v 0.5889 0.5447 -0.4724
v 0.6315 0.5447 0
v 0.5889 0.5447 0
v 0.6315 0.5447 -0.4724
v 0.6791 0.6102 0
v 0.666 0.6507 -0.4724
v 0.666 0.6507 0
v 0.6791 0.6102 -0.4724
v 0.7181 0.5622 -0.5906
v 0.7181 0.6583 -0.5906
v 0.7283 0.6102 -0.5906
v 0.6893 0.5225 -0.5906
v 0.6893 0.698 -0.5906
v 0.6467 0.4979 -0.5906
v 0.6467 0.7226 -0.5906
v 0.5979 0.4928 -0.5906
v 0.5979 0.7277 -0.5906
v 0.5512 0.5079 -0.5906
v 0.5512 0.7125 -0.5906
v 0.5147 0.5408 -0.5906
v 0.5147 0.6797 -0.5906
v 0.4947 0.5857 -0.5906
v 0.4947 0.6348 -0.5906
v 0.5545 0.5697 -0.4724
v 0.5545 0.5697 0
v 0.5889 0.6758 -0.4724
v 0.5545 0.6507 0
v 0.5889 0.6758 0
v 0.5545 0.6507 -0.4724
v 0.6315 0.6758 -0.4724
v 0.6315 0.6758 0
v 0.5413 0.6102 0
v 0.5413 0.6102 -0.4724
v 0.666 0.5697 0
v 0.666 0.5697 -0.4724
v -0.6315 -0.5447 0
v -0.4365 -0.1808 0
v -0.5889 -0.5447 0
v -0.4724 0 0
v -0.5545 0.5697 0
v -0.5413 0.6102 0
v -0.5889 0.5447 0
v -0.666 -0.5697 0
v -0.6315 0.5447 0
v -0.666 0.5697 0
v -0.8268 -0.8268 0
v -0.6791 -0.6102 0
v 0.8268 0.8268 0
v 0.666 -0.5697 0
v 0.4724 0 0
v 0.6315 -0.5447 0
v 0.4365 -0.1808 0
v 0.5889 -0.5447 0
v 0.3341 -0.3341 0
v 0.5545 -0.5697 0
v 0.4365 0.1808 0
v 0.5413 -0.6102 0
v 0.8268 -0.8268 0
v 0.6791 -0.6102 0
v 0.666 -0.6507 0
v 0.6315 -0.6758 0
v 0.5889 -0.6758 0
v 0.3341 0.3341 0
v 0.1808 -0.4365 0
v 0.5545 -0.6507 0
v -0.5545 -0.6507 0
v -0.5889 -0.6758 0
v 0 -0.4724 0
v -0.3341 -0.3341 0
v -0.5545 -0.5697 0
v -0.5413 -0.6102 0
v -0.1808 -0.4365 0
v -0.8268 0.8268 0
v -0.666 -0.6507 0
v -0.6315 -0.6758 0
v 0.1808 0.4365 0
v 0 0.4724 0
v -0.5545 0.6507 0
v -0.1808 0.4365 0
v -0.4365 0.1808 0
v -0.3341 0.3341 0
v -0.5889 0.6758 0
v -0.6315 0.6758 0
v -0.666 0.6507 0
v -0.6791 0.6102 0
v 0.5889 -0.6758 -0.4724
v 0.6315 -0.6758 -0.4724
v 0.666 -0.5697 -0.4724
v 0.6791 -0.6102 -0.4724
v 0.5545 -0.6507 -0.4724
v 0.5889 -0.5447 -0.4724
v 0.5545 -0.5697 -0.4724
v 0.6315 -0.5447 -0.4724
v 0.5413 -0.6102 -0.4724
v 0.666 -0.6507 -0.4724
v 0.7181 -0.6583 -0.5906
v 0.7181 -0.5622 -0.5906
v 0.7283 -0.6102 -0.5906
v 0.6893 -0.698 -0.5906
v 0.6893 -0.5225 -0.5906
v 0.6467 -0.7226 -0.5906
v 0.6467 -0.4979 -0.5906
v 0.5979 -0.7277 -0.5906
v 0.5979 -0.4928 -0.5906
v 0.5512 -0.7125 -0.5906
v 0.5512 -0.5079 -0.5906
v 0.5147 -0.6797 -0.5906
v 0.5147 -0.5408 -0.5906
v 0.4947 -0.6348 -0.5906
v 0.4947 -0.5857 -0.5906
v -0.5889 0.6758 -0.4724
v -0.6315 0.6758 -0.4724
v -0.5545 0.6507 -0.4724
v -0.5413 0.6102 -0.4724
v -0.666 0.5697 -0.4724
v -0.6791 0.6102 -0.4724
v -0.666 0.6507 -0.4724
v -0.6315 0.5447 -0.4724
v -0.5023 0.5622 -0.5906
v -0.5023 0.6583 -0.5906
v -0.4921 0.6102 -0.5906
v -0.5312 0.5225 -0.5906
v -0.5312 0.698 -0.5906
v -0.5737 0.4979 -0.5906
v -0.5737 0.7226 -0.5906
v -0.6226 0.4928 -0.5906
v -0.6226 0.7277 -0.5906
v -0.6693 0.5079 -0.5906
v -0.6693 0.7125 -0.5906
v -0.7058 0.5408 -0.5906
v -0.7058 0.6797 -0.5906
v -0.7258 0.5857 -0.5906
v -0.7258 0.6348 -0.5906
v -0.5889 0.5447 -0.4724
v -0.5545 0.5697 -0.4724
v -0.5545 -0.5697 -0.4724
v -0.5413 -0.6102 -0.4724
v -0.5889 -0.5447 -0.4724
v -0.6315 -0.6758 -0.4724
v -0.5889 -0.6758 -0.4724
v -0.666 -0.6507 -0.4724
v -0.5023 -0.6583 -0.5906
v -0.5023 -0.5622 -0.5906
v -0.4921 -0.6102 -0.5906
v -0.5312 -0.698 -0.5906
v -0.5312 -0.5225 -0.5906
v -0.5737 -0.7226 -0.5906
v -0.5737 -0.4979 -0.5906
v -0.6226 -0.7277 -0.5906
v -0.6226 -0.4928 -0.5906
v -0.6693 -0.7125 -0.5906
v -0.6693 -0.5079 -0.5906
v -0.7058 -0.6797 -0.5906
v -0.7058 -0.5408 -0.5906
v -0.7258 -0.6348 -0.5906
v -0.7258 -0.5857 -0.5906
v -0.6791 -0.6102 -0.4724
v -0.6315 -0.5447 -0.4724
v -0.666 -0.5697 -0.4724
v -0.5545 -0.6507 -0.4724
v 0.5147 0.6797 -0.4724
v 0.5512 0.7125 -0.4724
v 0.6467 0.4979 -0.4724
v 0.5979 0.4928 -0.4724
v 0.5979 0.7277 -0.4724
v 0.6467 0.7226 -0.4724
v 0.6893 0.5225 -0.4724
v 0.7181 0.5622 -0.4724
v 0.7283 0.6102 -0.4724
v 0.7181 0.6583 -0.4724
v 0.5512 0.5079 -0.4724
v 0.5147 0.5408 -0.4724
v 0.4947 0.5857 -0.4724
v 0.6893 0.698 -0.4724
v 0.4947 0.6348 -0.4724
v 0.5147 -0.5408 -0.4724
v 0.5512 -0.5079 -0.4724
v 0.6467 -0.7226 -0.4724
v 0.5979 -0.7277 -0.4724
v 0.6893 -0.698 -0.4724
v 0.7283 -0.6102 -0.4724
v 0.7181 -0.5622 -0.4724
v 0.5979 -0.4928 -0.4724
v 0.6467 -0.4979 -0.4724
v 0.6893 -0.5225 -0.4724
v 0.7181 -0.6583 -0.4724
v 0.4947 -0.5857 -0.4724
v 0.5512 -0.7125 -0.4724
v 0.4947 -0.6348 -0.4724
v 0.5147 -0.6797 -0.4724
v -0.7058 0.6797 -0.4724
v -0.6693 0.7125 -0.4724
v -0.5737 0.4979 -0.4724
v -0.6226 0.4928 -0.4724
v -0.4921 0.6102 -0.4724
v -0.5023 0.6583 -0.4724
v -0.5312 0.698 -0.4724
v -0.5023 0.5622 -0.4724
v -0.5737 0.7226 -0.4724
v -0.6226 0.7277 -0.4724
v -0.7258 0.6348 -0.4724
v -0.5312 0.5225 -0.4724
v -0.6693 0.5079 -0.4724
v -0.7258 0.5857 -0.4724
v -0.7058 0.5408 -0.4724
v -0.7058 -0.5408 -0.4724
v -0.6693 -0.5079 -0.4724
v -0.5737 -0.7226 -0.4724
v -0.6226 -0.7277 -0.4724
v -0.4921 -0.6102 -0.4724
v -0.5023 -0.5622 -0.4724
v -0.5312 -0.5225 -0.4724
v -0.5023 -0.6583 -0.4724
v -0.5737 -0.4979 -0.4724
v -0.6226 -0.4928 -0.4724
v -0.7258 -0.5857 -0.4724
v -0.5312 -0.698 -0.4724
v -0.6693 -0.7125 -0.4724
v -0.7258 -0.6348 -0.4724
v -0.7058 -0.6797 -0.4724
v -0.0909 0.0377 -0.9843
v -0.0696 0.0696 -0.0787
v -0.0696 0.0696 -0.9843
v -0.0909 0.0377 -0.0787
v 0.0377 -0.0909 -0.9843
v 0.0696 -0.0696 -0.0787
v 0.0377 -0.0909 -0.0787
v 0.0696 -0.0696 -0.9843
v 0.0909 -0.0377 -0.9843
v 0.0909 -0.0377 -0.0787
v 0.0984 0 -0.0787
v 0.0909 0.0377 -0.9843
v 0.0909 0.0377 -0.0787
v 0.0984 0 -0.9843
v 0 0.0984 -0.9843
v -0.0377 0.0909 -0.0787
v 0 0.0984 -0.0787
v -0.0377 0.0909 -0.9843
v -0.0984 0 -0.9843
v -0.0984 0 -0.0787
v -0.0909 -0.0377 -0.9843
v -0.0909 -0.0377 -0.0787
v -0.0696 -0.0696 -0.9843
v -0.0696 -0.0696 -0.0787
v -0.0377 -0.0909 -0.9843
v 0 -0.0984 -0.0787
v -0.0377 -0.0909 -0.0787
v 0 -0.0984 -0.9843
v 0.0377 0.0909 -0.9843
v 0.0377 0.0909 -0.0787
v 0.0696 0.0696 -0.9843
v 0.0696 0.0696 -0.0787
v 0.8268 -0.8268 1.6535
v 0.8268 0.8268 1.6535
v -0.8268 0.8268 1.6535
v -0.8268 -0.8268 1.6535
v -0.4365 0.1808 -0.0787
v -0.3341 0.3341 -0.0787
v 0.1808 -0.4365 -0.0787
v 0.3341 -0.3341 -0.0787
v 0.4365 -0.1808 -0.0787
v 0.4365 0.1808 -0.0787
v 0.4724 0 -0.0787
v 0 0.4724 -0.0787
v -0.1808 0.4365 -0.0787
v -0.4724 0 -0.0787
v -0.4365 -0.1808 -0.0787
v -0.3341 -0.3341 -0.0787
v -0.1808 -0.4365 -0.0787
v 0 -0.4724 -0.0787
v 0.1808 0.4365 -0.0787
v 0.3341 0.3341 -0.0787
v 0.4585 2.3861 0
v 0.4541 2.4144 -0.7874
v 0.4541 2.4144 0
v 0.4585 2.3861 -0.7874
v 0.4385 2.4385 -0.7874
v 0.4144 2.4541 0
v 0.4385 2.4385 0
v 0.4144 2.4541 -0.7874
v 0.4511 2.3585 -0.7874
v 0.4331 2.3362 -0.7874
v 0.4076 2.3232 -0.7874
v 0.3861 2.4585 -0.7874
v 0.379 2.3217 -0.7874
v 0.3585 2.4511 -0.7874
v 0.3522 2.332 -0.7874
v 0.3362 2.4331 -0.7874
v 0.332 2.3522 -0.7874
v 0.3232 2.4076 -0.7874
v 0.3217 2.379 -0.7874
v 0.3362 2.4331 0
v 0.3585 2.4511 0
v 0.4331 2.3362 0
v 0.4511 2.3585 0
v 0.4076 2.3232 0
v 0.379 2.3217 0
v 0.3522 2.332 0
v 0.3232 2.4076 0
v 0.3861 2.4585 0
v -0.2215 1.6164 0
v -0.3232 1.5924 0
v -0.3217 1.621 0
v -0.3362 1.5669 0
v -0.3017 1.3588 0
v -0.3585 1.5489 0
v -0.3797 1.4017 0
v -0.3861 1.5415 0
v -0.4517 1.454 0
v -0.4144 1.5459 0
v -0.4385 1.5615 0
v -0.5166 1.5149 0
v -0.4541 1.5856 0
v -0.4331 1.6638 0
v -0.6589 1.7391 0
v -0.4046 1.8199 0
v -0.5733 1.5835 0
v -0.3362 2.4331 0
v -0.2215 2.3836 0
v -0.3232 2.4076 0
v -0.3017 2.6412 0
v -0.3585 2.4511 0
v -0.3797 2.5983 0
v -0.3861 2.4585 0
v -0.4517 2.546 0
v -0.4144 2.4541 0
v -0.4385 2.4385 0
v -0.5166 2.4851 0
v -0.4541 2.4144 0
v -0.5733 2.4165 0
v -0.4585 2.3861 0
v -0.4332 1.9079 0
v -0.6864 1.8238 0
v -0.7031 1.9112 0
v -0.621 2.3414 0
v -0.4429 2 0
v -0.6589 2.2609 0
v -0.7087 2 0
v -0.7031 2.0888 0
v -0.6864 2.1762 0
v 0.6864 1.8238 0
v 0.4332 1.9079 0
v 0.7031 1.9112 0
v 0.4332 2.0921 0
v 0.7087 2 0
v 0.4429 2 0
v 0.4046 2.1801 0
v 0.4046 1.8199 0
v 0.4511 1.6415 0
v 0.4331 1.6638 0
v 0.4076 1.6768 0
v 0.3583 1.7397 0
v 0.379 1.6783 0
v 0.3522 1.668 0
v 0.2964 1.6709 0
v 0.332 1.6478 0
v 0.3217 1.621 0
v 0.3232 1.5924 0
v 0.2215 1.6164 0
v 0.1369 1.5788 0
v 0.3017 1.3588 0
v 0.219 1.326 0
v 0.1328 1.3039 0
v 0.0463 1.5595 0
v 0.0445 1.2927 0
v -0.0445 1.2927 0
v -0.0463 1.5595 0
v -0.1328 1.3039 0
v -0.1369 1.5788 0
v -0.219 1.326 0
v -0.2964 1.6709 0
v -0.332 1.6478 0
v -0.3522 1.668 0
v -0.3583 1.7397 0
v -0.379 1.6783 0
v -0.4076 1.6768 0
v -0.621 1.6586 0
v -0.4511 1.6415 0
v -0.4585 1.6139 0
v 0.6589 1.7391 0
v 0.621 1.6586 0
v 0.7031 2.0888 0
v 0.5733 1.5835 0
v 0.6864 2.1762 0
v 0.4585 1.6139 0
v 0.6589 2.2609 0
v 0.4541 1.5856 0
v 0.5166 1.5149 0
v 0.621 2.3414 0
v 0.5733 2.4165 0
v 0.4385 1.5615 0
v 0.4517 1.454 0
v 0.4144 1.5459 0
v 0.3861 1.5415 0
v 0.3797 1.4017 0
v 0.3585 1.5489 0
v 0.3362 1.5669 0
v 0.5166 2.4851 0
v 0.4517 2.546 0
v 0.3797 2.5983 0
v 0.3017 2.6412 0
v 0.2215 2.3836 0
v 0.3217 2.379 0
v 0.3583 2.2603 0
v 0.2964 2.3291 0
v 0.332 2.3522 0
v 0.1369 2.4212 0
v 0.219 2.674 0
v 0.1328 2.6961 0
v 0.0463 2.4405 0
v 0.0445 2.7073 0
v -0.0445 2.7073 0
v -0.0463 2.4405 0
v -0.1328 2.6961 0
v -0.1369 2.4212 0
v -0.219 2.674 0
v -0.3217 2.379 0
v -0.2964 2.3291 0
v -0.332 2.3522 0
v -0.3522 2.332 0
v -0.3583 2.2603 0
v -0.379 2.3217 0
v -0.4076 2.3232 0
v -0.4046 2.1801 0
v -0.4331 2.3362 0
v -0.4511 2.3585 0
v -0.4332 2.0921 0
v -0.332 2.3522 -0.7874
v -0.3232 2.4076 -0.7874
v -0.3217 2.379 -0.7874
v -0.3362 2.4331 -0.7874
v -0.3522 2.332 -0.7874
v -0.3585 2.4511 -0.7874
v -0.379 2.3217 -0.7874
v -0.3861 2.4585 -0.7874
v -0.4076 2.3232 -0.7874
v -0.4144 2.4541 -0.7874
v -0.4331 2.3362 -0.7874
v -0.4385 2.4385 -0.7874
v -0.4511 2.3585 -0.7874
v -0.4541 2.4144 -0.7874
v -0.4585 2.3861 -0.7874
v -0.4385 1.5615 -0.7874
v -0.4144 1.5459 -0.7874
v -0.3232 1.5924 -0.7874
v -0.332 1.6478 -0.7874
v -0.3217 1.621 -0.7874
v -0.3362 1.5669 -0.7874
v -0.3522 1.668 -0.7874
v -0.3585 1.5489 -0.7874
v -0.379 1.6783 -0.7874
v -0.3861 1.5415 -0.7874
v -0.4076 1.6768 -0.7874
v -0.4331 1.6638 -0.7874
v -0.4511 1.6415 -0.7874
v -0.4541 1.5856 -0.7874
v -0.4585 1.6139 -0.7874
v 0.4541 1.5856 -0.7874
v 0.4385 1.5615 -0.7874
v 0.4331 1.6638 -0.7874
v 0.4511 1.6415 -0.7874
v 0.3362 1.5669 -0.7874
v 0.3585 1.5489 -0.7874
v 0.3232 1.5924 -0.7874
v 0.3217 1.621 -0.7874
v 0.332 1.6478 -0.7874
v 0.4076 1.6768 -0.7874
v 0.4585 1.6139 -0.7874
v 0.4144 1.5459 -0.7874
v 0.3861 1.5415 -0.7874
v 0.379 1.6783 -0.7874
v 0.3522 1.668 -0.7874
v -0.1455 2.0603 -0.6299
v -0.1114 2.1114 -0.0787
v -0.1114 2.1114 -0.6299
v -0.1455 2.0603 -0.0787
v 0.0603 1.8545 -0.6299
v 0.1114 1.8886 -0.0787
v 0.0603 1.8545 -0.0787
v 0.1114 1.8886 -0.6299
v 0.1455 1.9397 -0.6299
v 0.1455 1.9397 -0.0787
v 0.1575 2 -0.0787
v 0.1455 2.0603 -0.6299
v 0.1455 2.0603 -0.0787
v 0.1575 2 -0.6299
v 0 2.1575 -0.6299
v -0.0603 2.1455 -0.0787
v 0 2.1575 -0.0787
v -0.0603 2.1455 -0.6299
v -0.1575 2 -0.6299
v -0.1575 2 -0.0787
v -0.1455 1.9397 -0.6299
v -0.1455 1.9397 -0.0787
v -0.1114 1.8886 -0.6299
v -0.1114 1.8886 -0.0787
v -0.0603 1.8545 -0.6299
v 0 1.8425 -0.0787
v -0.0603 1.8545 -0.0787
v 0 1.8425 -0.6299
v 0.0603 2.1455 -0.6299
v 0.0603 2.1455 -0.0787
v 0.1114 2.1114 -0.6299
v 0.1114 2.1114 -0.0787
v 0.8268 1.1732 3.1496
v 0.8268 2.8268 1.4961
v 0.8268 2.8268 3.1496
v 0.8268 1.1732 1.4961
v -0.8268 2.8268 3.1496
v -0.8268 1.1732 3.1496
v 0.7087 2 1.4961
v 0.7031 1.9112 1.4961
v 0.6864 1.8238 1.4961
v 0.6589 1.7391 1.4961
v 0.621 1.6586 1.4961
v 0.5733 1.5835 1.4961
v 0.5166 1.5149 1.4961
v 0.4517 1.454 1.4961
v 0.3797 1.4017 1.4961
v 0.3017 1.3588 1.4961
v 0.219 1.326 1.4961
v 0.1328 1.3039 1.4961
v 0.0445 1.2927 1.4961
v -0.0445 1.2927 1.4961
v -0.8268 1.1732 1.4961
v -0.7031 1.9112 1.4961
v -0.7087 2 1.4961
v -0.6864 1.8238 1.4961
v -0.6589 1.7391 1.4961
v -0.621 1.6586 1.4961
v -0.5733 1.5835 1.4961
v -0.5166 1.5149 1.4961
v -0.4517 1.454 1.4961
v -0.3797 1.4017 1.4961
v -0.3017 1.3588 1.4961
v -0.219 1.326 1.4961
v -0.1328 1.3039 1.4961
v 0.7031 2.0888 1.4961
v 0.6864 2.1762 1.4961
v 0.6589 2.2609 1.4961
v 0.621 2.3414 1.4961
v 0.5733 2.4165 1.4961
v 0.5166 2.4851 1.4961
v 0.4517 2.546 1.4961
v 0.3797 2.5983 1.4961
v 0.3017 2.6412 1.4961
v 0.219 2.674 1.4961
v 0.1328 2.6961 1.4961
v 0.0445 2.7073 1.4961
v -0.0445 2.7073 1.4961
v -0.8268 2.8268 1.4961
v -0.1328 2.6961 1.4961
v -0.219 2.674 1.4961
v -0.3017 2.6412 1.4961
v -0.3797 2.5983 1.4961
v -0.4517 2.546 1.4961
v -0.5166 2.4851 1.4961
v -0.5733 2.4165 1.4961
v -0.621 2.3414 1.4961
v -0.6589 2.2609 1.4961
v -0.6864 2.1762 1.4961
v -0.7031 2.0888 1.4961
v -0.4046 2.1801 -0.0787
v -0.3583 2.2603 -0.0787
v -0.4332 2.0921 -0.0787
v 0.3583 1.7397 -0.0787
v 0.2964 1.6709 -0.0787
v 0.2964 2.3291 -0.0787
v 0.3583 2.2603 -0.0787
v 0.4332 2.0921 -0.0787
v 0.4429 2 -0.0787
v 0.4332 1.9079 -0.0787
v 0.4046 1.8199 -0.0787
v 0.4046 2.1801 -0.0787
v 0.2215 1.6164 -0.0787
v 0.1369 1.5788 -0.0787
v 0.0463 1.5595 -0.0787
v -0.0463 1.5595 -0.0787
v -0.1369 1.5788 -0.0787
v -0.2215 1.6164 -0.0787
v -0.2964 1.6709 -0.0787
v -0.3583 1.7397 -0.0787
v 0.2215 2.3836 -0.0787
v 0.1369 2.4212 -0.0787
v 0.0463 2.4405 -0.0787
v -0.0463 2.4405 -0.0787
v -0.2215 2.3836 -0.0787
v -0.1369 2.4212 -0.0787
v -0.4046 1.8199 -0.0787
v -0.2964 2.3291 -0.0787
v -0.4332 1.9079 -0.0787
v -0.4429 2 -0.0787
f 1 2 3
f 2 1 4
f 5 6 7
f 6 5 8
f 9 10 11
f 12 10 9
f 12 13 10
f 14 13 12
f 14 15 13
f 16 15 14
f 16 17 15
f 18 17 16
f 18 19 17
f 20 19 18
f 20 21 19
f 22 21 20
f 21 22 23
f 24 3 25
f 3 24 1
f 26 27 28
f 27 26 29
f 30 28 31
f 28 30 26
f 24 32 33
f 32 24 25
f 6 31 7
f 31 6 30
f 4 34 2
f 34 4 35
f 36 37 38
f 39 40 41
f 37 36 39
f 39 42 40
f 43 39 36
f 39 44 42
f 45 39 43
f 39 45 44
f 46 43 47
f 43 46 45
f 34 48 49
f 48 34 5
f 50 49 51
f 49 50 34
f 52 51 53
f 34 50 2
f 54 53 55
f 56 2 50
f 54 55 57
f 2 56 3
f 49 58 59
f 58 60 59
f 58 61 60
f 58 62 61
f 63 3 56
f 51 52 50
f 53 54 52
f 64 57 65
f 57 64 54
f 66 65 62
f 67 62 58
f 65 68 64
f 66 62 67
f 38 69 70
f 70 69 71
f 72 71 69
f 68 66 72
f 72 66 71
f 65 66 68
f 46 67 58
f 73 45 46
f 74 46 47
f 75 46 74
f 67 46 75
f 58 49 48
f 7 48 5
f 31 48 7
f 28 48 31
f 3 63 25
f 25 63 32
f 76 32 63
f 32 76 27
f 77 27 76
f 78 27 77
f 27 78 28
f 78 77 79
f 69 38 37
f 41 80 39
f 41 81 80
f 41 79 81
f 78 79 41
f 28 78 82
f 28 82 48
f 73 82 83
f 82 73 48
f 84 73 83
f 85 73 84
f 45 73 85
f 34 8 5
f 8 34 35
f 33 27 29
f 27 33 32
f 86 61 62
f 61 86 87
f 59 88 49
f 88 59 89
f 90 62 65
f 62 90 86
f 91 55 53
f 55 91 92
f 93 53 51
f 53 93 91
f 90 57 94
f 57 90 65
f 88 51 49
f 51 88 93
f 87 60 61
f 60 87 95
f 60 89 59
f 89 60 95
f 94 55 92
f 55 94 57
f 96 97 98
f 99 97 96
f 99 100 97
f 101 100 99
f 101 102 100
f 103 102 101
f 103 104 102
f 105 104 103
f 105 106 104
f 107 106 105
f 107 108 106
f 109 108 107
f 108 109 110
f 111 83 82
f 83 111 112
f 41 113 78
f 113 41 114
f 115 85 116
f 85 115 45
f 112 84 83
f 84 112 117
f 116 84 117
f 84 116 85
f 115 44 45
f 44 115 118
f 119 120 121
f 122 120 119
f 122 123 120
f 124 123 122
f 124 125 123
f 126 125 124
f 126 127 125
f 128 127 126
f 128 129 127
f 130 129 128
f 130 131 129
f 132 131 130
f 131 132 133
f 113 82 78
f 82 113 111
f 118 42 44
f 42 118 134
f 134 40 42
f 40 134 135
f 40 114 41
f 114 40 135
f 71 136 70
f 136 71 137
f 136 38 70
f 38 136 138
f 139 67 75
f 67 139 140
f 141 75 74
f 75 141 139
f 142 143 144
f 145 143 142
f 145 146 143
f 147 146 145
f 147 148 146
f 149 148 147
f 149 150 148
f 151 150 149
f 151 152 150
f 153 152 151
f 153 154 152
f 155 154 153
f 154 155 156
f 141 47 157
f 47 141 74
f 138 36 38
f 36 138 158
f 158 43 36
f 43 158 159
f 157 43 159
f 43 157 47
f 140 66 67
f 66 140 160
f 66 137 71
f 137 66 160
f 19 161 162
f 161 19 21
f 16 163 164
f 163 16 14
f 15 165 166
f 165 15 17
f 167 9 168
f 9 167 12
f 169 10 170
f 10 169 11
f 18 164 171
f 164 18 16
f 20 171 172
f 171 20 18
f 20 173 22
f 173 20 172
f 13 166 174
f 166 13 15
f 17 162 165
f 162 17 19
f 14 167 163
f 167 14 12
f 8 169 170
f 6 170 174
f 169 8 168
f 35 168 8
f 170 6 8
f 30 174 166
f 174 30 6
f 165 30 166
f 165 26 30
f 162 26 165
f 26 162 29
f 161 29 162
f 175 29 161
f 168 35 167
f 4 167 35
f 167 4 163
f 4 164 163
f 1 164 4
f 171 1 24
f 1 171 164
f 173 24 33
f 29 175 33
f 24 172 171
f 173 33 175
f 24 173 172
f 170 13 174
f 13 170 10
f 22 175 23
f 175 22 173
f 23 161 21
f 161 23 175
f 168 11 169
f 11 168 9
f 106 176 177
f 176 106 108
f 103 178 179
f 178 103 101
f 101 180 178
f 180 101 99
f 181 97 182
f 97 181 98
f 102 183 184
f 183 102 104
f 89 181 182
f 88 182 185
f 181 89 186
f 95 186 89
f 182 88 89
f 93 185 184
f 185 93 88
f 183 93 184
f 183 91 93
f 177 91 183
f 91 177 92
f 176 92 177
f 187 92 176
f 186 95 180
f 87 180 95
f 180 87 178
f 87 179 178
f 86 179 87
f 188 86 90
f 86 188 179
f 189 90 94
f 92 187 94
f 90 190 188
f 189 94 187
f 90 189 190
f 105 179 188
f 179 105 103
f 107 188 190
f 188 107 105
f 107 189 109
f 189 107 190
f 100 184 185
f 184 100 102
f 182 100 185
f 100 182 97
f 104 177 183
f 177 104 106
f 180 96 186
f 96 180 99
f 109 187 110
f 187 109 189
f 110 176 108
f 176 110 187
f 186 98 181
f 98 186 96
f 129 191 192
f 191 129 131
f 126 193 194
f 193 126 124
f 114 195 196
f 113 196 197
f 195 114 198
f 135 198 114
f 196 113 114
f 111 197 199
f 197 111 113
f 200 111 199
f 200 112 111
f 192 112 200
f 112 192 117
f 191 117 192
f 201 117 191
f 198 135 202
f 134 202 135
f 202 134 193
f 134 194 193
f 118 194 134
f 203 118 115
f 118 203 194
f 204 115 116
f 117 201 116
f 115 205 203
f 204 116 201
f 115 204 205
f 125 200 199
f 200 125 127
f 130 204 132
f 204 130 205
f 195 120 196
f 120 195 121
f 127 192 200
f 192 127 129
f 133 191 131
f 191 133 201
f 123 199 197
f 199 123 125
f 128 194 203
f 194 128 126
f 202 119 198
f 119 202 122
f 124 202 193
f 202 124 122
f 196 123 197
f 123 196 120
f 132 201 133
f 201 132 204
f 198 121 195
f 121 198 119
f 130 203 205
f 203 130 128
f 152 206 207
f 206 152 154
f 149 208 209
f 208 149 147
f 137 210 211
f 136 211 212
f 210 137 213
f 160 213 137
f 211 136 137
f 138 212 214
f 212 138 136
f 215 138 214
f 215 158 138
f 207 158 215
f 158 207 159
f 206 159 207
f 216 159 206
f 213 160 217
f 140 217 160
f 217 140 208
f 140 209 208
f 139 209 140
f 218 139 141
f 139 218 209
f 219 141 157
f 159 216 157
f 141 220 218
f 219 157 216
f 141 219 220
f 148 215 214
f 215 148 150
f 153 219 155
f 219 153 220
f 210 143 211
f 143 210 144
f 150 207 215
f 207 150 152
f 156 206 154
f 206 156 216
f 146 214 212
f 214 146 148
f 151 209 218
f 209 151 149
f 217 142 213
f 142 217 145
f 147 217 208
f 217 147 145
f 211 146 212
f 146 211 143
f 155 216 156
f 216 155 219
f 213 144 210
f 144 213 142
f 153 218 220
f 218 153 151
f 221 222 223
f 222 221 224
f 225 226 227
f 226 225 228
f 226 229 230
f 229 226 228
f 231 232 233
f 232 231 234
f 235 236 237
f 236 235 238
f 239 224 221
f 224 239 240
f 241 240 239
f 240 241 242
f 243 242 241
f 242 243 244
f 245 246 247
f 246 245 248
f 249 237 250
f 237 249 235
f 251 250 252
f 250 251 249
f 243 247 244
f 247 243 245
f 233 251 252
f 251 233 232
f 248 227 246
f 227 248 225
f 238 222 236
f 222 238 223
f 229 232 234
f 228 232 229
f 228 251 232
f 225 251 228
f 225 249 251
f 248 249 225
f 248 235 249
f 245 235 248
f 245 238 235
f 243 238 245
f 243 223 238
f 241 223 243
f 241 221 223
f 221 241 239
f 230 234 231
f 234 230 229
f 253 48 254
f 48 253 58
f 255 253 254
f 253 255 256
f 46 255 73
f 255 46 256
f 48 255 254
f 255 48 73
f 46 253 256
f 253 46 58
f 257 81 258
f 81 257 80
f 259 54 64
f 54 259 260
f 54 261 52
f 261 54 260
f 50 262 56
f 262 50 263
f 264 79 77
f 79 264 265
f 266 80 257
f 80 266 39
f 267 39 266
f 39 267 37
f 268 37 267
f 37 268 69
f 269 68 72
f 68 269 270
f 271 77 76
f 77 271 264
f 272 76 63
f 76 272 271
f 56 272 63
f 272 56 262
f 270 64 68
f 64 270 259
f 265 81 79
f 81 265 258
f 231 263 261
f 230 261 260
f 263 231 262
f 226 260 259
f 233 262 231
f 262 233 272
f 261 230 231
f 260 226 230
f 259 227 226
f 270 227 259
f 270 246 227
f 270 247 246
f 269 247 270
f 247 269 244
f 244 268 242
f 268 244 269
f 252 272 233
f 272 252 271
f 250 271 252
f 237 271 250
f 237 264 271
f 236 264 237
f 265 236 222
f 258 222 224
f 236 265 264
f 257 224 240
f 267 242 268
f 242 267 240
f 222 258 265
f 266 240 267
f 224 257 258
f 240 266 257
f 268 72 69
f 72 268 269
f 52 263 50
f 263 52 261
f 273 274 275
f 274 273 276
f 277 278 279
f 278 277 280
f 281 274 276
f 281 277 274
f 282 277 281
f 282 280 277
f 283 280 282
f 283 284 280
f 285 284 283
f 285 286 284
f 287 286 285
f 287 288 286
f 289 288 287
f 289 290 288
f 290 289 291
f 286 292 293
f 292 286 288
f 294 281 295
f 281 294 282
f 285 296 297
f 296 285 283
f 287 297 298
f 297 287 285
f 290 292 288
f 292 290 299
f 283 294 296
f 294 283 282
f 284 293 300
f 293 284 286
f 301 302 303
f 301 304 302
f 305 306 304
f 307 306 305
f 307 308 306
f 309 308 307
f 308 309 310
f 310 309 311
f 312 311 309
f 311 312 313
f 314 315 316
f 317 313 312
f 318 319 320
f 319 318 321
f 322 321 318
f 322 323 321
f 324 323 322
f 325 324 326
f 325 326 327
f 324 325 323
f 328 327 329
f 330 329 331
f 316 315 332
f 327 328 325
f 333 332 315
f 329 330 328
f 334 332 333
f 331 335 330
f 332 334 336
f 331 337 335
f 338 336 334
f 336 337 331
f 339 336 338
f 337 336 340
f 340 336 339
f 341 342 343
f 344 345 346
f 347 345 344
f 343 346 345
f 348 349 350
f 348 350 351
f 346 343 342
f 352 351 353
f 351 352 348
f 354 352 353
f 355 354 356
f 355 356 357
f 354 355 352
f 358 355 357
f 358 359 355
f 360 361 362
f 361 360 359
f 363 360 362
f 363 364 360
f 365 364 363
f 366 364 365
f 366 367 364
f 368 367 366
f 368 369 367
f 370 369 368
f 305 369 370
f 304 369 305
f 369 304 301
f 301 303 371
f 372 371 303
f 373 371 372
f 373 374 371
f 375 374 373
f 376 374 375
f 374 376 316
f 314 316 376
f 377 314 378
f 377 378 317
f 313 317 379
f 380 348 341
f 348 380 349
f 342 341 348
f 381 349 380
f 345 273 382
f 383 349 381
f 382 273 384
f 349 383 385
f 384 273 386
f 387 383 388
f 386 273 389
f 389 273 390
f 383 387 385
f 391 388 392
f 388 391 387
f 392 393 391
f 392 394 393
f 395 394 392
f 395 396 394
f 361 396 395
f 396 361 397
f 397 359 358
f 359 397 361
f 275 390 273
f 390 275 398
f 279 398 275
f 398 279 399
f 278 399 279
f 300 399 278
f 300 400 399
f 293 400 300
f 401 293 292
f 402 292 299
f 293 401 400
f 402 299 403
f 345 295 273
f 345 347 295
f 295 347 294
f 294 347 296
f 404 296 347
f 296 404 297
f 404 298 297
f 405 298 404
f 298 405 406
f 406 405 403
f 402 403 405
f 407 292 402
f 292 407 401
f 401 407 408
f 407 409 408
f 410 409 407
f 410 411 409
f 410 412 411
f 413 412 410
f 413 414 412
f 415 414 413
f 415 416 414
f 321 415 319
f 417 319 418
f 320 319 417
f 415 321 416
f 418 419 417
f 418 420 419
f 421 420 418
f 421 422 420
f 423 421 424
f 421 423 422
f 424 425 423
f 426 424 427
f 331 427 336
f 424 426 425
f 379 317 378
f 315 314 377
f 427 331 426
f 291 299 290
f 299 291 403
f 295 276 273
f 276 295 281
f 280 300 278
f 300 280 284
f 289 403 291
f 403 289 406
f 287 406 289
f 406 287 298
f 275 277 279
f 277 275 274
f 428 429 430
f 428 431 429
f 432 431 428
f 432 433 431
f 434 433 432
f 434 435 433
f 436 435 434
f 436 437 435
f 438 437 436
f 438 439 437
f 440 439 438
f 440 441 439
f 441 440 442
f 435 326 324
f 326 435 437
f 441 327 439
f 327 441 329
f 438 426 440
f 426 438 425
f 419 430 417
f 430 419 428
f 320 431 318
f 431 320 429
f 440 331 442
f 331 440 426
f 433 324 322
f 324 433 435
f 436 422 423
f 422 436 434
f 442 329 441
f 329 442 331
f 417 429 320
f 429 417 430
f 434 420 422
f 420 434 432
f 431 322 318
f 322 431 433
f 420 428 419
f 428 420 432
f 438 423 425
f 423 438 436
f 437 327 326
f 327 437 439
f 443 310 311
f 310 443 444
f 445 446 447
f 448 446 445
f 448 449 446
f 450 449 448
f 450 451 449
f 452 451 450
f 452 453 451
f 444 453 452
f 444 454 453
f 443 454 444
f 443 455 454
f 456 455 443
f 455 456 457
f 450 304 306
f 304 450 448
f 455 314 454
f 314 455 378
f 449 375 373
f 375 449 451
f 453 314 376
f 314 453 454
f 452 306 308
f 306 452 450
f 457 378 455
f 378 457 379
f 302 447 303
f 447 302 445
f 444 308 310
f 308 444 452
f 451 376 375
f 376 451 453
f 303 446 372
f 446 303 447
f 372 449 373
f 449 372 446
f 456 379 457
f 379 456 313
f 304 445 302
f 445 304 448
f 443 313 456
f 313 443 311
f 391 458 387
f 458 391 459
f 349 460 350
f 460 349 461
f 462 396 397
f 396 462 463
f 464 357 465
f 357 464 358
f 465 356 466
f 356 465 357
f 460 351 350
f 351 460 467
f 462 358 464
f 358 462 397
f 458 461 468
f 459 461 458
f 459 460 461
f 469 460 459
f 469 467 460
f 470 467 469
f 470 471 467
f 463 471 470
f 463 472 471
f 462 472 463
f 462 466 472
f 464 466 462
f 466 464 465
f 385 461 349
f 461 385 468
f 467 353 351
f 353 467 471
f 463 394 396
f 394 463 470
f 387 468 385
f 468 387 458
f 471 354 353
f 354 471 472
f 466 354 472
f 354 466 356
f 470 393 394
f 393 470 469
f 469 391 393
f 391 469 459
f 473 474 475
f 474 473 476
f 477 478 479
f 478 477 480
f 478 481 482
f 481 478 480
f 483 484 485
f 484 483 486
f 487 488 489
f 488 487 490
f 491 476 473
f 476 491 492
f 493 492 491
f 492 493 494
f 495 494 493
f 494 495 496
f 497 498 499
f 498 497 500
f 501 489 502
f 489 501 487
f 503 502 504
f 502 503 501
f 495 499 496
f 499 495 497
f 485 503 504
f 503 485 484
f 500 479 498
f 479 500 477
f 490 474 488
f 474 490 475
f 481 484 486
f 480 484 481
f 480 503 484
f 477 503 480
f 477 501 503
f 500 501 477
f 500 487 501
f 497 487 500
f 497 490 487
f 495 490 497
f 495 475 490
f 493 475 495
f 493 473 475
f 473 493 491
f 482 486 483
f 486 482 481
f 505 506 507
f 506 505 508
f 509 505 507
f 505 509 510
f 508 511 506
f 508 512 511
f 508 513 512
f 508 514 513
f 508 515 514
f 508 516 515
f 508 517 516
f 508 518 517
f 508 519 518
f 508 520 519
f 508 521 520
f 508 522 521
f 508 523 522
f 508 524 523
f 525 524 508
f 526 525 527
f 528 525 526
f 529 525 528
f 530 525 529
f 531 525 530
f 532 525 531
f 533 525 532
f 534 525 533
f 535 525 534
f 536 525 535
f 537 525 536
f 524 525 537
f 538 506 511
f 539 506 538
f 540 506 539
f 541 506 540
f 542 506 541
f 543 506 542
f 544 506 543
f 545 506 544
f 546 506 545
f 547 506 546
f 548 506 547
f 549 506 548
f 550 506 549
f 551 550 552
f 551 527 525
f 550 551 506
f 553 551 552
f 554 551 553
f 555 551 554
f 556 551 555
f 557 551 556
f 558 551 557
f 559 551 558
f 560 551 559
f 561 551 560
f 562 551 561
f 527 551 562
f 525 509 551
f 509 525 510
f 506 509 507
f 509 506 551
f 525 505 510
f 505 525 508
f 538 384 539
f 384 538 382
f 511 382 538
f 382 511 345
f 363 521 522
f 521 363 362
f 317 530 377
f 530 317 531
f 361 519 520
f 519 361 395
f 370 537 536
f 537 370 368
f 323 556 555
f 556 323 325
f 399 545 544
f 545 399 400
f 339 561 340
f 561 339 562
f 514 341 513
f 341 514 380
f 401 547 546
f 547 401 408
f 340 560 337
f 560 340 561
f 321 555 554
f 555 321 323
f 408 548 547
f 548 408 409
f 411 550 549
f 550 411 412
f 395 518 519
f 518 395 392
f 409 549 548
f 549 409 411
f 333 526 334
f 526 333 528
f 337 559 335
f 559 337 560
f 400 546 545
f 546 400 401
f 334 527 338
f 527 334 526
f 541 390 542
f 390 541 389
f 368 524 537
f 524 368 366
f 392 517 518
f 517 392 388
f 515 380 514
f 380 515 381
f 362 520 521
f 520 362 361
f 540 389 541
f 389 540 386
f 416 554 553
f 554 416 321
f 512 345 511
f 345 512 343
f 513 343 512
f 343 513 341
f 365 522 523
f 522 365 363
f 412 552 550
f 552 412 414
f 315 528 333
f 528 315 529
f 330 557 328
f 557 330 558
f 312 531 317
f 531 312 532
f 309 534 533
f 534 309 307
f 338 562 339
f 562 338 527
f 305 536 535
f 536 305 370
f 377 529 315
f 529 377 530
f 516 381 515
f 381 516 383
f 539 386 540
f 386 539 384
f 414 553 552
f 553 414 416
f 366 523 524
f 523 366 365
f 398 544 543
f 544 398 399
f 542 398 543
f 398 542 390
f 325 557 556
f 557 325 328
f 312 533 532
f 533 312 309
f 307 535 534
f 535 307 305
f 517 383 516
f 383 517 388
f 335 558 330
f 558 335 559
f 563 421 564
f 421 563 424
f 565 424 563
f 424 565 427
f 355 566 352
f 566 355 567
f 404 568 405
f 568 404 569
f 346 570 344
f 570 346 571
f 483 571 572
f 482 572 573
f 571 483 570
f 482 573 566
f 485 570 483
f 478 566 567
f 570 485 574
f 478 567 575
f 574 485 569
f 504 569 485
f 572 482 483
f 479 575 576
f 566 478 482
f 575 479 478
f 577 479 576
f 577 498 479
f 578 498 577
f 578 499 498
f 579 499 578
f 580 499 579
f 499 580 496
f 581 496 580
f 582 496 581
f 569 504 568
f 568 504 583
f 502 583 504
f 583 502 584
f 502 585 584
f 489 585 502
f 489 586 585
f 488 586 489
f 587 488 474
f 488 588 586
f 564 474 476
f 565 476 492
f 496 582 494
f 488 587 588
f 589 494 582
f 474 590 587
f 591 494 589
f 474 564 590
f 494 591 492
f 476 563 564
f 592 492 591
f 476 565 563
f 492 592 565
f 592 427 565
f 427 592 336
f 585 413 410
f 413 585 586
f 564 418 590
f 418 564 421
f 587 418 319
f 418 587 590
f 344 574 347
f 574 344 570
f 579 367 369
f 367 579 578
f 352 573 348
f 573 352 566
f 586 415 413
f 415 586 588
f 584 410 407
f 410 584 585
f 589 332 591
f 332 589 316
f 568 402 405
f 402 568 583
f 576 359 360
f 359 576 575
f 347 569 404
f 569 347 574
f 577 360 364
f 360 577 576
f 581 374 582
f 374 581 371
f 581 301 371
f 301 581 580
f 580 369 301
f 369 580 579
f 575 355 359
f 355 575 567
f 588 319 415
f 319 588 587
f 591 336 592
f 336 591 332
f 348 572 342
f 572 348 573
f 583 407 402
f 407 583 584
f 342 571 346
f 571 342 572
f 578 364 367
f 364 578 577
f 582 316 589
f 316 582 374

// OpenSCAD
module NEMA17(cutter=false) {
  color("DimGrey")
  render()
  scale(1/25.4) {

    // Output Shaft
    mirror([0,0,1])
    cylinder(r=5/2, h=25, $fn=16);

    // Motor Body
    translate([-21, -21,0])
    cube([42, 42, 42]);

    // Center boss
    mirror([0,0,1])
    cylinder(r=(24/2), h=2 + (cutter?25:0), $fn=16);

    // Mounting bolts
    for (X = [1,-1]) for (Y=[1,-1])
    translate([X*31/2, Y*31/2, 0])
    mirror([0,0,1])
    cylinder(r=3.5/2, h=15, $fn=10);

    // Mounting bolts
    for (X = [1,-1]) for (Y=[1,-1])
    translate([X*31/2, Y*31/2, -12])
    mirror([0,0,1])
    cylinder(r=6/2, h=3+(cutter?12:0), $fn=15);
  }
}

module PlanetaryNEMA17(cutter=true) {
  color("DimGrey")
  render()
  scale(1/25.4) {

    // Output Shaft
    mirror([0,0,1])
    cylinder(r=8/2, h=16, $fn=16);

    // Motor Body
    translate([-21, -21,38])
    cube([42, 42, 42]);

    // Gearbox
    cylinder(r=(36/2), h=38 + (cutter?25:0), $fn=50);

    // Center boss
    mirror([0,0,1])
    cylinder(r=(22.5/2), h=2, $fn=30);

    // Mounting bolts
    for (R = [0:90:360]) rotate(45+R)
    translate([28/2, 0, 0])
    mirror([0,0,1])
    cylinder(r=3.5/2, h=8+(cutter?12:0), $fn=15);
  }
}
NEMA17();

translate([0,2,0])
PlanetaryNEMA17();
